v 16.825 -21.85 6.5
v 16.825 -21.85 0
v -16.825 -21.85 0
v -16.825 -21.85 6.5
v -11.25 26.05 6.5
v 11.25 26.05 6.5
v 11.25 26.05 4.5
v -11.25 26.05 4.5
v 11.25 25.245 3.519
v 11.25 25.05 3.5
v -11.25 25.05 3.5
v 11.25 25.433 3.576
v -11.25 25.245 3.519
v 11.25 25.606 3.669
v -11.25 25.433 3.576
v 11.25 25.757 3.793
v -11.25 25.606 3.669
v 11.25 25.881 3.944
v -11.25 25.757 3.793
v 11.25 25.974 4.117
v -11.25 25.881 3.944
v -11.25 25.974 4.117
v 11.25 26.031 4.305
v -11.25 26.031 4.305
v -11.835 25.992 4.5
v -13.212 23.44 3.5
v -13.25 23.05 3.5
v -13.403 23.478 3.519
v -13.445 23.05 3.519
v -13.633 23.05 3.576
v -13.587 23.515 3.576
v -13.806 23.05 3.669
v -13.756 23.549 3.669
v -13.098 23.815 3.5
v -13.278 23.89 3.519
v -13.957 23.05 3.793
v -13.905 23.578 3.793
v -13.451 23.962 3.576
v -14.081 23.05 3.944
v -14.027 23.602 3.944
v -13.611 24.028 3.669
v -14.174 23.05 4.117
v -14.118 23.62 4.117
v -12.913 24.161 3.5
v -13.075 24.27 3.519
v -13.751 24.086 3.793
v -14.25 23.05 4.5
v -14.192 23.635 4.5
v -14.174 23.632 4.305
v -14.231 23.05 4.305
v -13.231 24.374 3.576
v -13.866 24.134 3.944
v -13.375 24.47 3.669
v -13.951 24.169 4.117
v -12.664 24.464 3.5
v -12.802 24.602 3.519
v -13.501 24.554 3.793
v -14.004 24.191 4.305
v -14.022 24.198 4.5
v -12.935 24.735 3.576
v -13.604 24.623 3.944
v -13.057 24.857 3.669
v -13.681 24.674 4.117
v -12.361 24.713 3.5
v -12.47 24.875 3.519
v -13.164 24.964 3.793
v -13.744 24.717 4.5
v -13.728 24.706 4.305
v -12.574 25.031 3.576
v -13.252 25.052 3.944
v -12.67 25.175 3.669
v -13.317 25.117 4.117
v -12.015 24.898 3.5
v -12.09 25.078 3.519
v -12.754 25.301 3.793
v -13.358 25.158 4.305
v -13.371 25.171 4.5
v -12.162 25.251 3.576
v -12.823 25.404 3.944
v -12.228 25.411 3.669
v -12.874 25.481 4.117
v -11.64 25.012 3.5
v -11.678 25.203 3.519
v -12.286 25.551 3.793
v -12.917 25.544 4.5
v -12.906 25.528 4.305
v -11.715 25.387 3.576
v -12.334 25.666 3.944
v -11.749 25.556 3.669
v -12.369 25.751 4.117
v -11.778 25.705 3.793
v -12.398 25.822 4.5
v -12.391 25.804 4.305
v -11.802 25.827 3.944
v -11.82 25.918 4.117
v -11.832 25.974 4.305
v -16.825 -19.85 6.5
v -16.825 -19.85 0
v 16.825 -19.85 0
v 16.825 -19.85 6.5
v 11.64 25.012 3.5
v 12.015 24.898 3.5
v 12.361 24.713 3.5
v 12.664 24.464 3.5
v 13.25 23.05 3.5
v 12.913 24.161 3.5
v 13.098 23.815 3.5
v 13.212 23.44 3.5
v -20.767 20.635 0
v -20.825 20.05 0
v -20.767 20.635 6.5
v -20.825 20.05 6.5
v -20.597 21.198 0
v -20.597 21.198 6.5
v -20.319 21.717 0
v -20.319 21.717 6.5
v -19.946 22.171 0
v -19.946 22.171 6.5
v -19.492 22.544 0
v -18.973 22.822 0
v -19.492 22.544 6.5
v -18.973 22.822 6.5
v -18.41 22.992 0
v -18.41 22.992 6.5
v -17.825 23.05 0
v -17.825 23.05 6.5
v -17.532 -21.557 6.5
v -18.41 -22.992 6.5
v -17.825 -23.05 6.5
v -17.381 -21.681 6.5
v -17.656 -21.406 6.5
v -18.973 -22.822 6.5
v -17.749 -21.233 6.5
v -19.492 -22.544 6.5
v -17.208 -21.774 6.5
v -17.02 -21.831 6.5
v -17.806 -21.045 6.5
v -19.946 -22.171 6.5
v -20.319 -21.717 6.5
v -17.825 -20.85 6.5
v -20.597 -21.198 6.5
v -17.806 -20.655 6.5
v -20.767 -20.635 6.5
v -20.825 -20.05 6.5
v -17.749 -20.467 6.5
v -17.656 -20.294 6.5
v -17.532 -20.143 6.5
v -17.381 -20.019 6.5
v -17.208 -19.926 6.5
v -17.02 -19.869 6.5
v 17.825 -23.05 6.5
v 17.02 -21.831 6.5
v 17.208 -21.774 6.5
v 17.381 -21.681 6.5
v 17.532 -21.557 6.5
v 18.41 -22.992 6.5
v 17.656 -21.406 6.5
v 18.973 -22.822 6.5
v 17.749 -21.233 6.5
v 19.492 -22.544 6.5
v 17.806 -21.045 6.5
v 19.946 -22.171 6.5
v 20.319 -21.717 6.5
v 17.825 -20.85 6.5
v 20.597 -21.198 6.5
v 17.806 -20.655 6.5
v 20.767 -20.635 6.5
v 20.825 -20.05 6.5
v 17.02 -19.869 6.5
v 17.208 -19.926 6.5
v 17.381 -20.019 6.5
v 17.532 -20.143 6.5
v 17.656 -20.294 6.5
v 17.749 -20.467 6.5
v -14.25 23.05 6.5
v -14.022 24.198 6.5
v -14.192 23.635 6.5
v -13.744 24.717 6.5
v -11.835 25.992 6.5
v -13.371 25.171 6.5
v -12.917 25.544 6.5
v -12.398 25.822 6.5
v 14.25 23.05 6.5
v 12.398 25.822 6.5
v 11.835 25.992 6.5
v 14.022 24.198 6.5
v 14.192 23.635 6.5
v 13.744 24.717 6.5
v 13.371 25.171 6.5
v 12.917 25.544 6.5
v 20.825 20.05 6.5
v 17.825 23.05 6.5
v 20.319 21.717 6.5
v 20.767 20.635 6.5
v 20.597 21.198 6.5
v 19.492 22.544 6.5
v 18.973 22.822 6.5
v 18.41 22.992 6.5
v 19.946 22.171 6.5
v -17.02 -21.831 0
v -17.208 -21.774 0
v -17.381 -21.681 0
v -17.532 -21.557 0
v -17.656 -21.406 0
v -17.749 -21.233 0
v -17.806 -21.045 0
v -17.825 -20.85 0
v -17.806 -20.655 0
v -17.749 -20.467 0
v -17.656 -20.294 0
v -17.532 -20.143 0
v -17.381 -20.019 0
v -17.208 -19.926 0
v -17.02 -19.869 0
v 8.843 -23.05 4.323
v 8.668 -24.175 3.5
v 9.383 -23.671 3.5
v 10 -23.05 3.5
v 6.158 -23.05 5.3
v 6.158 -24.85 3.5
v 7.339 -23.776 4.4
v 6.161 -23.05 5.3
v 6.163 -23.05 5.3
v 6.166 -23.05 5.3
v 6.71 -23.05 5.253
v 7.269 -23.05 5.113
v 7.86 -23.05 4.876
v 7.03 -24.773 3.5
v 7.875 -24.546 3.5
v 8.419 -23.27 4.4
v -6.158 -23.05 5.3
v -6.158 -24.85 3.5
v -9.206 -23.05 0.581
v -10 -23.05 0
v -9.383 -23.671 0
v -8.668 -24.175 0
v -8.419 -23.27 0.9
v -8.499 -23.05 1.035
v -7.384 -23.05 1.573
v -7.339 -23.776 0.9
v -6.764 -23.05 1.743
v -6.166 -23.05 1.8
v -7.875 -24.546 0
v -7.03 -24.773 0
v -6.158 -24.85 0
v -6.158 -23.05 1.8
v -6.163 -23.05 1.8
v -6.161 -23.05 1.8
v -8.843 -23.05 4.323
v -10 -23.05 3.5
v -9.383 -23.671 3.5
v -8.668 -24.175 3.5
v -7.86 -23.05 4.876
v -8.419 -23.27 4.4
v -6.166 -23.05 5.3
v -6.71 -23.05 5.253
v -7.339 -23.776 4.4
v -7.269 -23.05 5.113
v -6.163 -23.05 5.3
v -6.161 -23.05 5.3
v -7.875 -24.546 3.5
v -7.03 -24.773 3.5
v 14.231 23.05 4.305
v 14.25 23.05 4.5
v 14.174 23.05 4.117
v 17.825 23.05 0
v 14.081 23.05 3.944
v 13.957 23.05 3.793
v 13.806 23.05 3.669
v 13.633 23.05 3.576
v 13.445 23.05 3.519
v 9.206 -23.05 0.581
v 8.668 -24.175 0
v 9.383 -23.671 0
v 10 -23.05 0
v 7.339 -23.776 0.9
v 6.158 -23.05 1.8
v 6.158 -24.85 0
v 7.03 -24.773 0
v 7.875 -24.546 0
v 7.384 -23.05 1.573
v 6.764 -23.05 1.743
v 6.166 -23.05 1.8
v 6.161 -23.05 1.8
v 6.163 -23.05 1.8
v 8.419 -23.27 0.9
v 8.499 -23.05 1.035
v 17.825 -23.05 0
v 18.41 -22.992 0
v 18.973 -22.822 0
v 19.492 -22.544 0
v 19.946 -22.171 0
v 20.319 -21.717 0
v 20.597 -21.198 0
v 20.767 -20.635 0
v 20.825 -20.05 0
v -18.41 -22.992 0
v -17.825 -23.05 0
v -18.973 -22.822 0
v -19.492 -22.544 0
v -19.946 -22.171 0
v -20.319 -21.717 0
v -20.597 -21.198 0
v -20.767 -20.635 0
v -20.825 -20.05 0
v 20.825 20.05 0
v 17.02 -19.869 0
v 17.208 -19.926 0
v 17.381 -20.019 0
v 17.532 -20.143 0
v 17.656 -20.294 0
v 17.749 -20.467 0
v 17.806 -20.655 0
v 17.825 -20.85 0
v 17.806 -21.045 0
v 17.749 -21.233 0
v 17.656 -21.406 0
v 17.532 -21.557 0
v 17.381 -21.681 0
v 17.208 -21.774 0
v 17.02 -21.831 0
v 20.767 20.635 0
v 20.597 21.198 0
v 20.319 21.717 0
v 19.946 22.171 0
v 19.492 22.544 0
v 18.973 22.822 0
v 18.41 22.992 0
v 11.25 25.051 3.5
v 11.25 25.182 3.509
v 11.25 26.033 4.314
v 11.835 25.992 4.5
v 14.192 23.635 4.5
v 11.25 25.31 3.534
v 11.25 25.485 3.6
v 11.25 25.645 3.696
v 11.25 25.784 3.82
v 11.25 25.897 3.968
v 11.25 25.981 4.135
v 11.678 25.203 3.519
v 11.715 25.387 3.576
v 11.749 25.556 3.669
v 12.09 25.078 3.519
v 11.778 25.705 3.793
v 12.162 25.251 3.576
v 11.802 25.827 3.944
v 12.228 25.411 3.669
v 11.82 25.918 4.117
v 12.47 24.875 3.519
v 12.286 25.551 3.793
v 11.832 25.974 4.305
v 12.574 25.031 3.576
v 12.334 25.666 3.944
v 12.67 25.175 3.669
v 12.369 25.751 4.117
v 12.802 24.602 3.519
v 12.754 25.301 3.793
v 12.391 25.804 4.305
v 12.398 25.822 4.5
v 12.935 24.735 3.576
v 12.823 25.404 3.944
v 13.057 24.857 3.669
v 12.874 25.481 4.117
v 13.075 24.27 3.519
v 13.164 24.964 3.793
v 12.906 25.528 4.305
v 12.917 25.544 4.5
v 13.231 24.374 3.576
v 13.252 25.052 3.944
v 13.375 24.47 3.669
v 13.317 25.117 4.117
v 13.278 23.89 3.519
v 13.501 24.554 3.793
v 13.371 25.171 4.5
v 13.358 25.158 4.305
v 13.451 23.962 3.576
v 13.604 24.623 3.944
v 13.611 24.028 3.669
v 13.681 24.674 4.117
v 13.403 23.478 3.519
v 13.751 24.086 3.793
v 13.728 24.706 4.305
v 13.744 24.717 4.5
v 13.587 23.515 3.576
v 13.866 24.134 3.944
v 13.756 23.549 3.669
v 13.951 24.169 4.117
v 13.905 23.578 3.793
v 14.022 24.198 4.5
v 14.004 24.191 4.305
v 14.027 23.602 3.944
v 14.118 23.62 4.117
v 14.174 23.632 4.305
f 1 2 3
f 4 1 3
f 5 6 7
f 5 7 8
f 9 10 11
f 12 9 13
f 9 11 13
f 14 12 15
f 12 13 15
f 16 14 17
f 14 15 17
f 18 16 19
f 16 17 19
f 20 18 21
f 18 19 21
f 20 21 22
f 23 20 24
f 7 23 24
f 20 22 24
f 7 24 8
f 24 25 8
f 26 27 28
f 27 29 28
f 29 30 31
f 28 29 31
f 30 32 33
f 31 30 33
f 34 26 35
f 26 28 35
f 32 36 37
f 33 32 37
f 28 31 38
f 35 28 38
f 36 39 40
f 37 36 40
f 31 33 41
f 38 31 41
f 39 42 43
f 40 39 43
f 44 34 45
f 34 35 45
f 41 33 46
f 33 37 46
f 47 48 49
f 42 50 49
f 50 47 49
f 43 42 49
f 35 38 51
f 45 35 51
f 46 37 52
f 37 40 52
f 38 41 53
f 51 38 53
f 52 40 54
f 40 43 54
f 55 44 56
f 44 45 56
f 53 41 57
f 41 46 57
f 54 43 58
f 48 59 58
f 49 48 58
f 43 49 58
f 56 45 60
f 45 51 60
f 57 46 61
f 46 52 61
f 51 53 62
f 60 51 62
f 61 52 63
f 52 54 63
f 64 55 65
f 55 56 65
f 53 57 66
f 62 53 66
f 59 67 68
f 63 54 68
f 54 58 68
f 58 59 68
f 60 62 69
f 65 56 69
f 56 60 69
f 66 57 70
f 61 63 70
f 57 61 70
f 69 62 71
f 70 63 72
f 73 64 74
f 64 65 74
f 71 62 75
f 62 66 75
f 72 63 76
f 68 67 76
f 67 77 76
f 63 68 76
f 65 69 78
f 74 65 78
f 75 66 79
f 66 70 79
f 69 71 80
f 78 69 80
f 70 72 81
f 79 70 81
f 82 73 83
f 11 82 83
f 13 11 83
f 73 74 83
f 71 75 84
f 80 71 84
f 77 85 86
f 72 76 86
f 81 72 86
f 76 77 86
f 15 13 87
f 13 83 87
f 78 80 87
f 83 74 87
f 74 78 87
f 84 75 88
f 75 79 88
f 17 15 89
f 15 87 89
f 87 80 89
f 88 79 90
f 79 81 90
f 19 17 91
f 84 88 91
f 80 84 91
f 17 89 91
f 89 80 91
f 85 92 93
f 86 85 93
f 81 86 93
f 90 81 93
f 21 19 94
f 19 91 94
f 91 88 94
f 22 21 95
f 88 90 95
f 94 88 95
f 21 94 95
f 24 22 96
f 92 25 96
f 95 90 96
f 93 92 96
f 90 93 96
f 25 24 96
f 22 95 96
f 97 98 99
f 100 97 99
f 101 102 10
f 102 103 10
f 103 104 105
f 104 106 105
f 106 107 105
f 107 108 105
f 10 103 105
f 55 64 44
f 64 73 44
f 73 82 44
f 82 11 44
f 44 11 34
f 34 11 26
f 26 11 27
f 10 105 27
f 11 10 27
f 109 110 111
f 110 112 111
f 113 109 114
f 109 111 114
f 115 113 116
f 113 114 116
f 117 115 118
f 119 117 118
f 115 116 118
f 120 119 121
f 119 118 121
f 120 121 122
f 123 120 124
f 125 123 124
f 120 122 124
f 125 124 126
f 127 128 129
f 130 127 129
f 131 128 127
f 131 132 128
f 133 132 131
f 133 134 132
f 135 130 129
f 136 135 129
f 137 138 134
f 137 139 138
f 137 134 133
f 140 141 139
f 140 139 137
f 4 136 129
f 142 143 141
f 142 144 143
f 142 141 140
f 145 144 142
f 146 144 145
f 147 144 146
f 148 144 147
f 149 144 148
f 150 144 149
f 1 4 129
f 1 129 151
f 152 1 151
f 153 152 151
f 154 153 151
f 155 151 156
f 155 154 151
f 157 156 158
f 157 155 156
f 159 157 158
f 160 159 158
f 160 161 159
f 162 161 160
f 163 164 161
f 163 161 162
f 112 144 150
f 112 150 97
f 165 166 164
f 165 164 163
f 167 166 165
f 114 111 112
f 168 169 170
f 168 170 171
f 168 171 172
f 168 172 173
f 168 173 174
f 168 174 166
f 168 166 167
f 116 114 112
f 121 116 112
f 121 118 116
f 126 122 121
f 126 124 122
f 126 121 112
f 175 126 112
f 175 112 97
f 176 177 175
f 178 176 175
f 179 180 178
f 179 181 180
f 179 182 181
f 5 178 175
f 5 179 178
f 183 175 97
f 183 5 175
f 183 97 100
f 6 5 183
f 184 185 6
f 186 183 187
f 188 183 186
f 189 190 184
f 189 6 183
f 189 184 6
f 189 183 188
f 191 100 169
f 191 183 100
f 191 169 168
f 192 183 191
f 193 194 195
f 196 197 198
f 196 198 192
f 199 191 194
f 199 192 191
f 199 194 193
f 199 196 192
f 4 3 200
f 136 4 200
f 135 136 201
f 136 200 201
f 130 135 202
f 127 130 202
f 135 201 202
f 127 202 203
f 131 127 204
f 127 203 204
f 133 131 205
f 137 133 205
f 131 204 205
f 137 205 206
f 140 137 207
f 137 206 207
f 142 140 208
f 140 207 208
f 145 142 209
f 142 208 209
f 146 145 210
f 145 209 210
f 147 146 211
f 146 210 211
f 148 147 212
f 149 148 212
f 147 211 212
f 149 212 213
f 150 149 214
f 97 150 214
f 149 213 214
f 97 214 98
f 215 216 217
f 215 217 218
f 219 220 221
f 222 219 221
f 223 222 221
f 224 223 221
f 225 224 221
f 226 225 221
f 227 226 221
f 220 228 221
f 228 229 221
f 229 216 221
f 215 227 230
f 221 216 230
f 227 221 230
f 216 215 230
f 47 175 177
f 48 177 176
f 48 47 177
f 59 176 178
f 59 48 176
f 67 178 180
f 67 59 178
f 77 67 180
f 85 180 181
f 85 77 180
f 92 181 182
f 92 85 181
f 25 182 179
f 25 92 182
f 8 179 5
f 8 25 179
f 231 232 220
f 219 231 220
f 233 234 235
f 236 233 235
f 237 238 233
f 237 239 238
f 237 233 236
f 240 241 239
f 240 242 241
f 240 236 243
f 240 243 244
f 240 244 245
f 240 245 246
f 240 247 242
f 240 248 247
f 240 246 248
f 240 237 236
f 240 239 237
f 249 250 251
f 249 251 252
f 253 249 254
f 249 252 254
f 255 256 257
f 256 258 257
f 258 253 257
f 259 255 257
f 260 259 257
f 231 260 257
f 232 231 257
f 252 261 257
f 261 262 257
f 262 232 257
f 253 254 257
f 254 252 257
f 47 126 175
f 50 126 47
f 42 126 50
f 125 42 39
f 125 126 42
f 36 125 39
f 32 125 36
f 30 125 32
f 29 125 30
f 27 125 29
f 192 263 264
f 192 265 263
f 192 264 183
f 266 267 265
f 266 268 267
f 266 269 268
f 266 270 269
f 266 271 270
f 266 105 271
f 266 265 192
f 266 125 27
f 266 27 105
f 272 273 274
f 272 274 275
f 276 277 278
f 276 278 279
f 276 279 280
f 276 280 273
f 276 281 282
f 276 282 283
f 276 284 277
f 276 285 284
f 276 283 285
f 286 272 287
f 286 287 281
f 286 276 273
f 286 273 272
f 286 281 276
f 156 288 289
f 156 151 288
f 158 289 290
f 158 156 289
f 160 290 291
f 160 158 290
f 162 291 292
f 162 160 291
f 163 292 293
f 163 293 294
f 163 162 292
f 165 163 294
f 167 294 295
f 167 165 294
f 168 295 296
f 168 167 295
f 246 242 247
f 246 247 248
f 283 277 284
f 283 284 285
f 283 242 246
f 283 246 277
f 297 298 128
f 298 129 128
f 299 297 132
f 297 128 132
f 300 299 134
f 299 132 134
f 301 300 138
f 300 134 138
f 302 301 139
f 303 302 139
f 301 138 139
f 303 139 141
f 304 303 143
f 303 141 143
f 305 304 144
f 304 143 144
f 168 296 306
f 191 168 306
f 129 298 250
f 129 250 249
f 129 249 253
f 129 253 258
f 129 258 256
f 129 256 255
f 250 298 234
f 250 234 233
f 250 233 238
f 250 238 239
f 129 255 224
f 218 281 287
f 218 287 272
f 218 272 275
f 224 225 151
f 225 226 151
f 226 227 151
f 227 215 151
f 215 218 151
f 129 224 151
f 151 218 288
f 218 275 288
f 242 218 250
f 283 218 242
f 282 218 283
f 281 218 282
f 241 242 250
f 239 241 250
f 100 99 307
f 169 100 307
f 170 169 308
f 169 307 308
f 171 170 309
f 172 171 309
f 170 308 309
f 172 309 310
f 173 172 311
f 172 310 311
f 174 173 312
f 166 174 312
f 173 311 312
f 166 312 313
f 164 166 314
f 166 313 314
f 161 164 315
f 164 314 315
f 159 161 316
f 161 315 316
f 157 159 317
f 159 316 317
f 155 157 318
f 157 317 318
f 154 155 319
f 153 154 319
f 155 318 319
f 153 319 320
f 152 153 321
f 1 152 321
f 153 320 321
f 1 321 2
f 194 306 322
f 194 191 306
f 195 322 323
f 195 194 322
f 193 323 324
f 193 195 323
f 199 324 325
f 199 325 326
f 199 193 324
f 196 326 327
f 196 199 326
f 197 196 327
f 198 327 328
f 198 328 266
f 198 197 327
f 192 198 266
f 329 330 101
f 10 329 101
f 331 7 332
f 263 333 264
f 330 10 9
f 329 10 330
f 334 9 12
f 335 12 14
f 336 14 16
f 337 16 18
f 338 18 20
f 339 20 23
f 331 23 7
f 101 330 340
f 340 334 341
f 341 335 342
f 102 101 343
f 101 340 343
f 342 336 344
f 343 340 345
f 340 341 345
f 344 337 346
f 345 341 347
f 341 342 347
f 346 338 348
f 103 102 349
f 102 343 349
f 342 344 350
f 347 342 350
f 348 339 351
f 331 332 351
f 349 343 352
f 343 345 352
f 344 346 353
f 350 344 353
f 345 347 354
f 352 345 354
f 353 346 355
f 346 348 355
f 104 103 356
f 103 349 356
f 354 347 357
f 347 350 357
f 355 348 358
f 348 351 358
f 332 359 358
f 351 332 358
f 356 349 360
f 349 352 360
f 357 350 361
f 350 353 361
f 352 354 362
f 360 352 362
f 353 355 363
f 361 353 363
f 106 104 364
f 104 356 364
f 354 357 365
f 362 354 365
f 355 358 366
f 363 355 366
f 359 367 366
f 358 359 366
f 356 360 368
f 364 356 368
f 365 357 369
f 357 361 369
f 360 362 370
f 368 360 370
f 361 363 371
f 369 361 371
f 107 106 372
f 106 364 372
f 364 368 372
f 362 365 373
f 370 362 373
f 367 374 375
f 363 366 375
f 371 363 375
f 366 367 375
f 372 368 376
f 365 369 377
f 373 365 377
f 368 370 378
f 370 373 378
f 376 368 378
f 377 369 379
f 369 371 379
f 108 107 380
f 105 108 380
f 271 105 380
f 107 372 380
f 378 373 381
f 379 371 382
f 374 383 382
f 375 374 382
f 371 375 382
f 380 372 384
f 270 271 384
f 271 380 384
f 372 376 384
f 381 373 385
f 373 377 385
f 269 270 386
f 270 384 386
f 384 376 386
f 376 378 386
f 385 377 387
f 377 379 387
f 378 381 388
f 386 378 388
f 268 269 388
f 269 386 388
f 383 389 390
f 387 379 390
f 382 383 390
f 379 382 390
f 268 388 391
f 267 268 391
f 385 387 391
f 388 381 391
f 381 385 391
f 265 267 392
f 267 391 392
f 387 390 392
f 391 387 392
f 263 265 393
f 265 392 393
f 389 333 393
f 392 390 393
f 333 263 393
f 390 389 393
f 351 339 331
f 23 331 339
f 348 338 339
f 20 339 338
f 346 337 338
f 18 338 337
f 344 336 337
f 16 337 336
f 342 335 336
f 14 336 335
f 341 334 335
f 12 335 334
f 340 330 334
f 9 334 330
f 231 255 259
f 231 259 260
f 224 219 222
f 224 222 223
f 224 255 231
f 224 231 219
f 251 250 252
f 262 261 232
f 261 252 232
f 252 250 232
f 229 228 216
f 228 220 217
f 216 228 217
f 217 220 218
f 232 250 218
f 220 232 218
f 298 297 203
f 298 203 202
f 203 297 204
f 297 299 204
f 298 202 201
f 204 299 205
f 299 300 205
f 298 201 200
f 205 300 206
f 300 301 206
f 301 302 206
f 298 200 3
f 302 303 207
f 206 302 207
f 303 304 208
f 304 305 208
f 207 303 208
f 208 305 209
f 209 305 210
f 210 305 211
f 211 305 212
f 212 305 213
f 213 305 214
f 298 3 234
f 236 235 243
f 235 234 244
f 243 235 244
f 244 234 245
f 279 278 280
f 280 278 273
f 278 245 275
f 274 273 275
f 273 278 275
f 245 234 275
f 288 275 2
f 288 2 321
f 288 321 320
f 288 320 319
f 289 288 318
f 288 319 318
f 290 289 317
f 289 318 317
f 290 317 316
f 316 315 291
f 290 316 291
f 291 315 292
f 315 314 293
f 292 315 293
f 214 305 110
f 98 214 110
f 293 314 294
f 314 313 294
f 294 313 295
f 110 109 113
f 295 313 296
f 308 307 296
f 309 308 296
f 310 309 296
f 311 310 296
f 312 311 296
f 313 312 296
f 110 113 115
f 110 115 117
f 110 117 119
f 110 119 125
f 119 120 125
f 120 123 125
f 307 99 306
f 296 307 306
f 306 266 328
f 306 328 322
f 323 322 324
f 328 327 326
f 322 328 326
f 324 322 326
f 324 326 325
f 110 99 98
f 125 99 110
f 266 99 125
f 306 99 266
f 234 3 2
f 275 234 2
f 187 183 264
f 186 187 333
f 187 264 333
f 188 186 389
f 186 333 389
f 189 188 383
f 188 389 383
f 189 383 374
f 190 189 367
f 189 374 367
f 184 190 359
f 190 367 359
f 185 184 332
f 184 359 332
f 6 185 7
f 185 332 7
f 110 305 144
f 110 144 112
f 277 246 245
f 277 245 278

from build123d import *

# Parameters (mm, degrees)
F0_W        = 41.65
F0_H        = 46.1
F1_DEPTH    = 6.5
F2_W        = 28.5
F2_H        = 3
F3_DEPTH    = 3
F4_R        = 1
F5_T1_DEPTH = 10.5
F5_T4_ANGLE = 90
F5_T6_ANGLE = 90
F6_W        = 20
F6_H        = 1.8
F7_DEPTH    = 1.8
F8_T1_DEPTH = 21.0093727123
F8_T3_DEPTH = 21.0093727123
F9_SIZE2    = 1.79999
F9_SIZE     = 1.79999
F10_R       = 3


# Not quite as in the source:
# - a fillet or chamfer that OpenCascade refuses, or shapes differently, is made with other operations: its cross-section is extruded or revolved along the edge and cut away or added
# - a fillet or chamfer is up to 0.001 mm smaller than in the source, because OpenCascade refuses the exact size


with BuildPart() as f1:
    # F0 (on Top) → F1 (new body)
    with BuildSketch(Plane.XY):
        Rectangle(F0_W, F0_H)
        with BuildLine():
            ThreePointArc((16.825, -19.85), (17.825, -20.85), (16.825, -21.85))
            Line((16.825, -21.85), (-16.825, -21.85))
            ThreePointArc((-16.825, -21.85), (-17.825, -20.85), (-16.825, -19.85))
            Line((-16.825, -19.85), (16.825, -19.85))
        make_face(mode=Mode.SUBTRACT)
    extrude(amount=F1_DEPTH)

    # F2 (on face) → F3 (join)
    with BuildSketch(Plane(origin=(0, 23.05, 0), x_dir=(-1, 0, 0), z_dir=(0, 1, 0))):
        with Locations((0, 5)):
            Rectangle(F2_W, F2_H)
    extrude(amount=F3_DEPTH)

    # F4
    f4_edges = [f1.edges().sort_by_distance(p)[0] for p in [
        (-14.25, 24.55, 3.5),
        (14.25, 24.55, 3.5),
        (0, 26.05, 3.5),
    ]]
    fillet(f4_edges, radius=F4_R)

    # F5: fillet of radius 3 on 3 edges, made by hand

    # F5_s2 → F5_t1 (cut)
    with BuildSketch(Plane.XY.offset(3.5)):
        with BuildLine():
            ThreePointArc((14.25, 23.05), (13.3713203436, 25.1713203436), (11.25, 26.05))
            Line((11.25, 26.05), (14.25, 26.05))
            Line((14.25, 26.05), (14.25, 23.05))
        make_face()
        with BuildLine():
            ThreePointArc((-14.25, 23.05), (-13.3713203436, 25.1713203436), (-11.25, 26.05))
            Line((-11.25, 26.05), (-14.25, 26.05))
            Line((-14.25, 26.05), (-14.25, 23.05))
        make_face()
    extrude(amount=F5_T1_DEPTH, mode=Mode.SUBTRACT)

    # F5_s3 → F5_t4 (revolve, cut)
    with BuildSketch(Plane.XZ.offset(-23.05)):
        with BuildLine():
            ThreePointArc((-13.25, 3.5), (-13.9571067812, 3.7928932188), (-14.25, 4.5))
            Line((-14.25, 4.5), (-14.25, 3.5))
            Line((-14.25, 3.5), (-13.25, 3.5))
        make_face()
    revolve(axis=Axis((-11.25, 23.05, 3.5), (0, 0, -1)), revolution_arc=F5_T4_ANGLE, mode=Mode.SUBTRACT)

    # F5_s5 → F5_t6 (revolve, cut)
    with BuildSketch(Plane.YZ.offset(11.25)):
        with BuildLine():
            ThreePointArc((25.05, 3.5), (25.7571067812, 3.7928932188), (26.05, 4.5))
            Line((26.05, 4.5), (26.05, 3.5))
            Line((26.05, 3.5), (25.05, 3.5))
        make_face()
    revolve(axis=Axis((11.25, 23.05, 3.5), (0, 0, -1)), revolution_arc=F5_T6_ANGLE, mode=Mode.SUBTRACT)

    # F6 (on face) → F7 (join)
    with BuildSketch(Plane.XZ.offset(23.05)):
        with Locations((0, 4.4)):
            Rectangle(F6_W, F6_H)
        with Locations((0, 0.9)):
            Rectangle(F6_W, F6_H)
    extrude(amount=F7_DEPTH)

    # F8: fillet of radius 5 on 4 edges, made by hand

    # F8_s2 → F8_t1 (cut)
    with BuildSketch(Plane.XY.offset(-6.1046863561)):
        with BuildLine():
            ThreePointArc((-10, -23.05), (-8.2794458011, -24.3776925691), (-6.1581254575, -24.85))
            Line((-6.1581254575, -24.85), (-6.1581254575, -24.95))
            Line((-6.1581254575, -24.95), (-10, -24.95))
            Line((-10, -24.95), (-10.1, -24.85))
            ThreePointArc((-10.1, -24.85), (-10.1, -23.95), (-10.0768374908, -23.114))
            Line((-10.0768374908, -23.114), (-10, -23.05))
        make_face()
        with BuildLine():
            ThreePointArc((10, -23.05), (8.2794458011, -24.3776925691), (6.1581254575, -24.85))
            Line((6.1581254575, -24.85), (6.1581254575, -24.95))
            Line((6.1581254575, -24.95), (10, -24.95))
            Line((10, -24.95), (10.1, -24.85))
            ThreePointArc((10.1, -24.85), (10.1, -23.95), (10.0768374908, -23.114))
            Line((10.0768374908, -23.114), (10, -23.05))
        make_face()
    extrude(amount=F8_T1_DEPTH, mode=Mode.SUBTRACT)

    # F8_s4 → F8_t3 (cut)
    with BuildSketch(Plane.XY.offset(-9.6046863561)):
        with BuildLine():
            ThreePointArc((-10, -23.05), (-8.2794458011, -24.3776925691), (-6.1581254575, -24.85))
            Line((-6.1581254575, -24.85), (-6.1581254575, -24.95))
            Line((-6.1581254575, -24.95), (-10, -24.95))
            Line((-10, -24.95), (-10.1, -24.85))
            ThreePointArc((-10.1, -24.85), (-10.1, -23.95), (-10.0768374908, -23.114))
            Line((-10.0768374908, -23.114), (-10, -23.05))
        make_face()
        with BuildLine():
            ThreePointArc((10, -23.05), (8.2794458011, -24.3776925691), (6.1581254575, -24.85))
            Line((6.1581254575, -24.85), (6.1581254575, -24.95))
            Line((6.1581254575, -24.95), (10, -24.95))
            Line((10, -24.95), (10.1, -24.85))
            ThreePointArc((10.1, -24.85), (10.1, -23.95), (10.0768374908, -23.114))
            Line((10.0768374908, -23.114), (10, -23.05))
        make_face()
    extrude(amount=F8_T3_DEPTH, mode=Mode.SUBTRACT)

    # F9 (size 1.8 and 1.8 in the source; OpenCascade refuses exactly that, so slightly less here)
    f9_edges = [f1.edges().sort_by_distance(p)[0] for p in [
        (0, -24.85, 5.3),
        (0, -24.85, 1.8),
    ]]
    chamfer(f9_edges, length=F9_SIZE, length2=F9_SIZE2)

    # F10
    f10_edges = [f1.edges().sort_by_distance(p)[0] for p in [
        (20.825, -23.05, 3.25),
        (20.825, 23.05, 3.25),
        (-20.825, 23.05, 3.25),
        (-20.825, -23.05, 3.25),
    ]]
    fillet(f10_edges, radius=F10_R)


solid = f1.part
